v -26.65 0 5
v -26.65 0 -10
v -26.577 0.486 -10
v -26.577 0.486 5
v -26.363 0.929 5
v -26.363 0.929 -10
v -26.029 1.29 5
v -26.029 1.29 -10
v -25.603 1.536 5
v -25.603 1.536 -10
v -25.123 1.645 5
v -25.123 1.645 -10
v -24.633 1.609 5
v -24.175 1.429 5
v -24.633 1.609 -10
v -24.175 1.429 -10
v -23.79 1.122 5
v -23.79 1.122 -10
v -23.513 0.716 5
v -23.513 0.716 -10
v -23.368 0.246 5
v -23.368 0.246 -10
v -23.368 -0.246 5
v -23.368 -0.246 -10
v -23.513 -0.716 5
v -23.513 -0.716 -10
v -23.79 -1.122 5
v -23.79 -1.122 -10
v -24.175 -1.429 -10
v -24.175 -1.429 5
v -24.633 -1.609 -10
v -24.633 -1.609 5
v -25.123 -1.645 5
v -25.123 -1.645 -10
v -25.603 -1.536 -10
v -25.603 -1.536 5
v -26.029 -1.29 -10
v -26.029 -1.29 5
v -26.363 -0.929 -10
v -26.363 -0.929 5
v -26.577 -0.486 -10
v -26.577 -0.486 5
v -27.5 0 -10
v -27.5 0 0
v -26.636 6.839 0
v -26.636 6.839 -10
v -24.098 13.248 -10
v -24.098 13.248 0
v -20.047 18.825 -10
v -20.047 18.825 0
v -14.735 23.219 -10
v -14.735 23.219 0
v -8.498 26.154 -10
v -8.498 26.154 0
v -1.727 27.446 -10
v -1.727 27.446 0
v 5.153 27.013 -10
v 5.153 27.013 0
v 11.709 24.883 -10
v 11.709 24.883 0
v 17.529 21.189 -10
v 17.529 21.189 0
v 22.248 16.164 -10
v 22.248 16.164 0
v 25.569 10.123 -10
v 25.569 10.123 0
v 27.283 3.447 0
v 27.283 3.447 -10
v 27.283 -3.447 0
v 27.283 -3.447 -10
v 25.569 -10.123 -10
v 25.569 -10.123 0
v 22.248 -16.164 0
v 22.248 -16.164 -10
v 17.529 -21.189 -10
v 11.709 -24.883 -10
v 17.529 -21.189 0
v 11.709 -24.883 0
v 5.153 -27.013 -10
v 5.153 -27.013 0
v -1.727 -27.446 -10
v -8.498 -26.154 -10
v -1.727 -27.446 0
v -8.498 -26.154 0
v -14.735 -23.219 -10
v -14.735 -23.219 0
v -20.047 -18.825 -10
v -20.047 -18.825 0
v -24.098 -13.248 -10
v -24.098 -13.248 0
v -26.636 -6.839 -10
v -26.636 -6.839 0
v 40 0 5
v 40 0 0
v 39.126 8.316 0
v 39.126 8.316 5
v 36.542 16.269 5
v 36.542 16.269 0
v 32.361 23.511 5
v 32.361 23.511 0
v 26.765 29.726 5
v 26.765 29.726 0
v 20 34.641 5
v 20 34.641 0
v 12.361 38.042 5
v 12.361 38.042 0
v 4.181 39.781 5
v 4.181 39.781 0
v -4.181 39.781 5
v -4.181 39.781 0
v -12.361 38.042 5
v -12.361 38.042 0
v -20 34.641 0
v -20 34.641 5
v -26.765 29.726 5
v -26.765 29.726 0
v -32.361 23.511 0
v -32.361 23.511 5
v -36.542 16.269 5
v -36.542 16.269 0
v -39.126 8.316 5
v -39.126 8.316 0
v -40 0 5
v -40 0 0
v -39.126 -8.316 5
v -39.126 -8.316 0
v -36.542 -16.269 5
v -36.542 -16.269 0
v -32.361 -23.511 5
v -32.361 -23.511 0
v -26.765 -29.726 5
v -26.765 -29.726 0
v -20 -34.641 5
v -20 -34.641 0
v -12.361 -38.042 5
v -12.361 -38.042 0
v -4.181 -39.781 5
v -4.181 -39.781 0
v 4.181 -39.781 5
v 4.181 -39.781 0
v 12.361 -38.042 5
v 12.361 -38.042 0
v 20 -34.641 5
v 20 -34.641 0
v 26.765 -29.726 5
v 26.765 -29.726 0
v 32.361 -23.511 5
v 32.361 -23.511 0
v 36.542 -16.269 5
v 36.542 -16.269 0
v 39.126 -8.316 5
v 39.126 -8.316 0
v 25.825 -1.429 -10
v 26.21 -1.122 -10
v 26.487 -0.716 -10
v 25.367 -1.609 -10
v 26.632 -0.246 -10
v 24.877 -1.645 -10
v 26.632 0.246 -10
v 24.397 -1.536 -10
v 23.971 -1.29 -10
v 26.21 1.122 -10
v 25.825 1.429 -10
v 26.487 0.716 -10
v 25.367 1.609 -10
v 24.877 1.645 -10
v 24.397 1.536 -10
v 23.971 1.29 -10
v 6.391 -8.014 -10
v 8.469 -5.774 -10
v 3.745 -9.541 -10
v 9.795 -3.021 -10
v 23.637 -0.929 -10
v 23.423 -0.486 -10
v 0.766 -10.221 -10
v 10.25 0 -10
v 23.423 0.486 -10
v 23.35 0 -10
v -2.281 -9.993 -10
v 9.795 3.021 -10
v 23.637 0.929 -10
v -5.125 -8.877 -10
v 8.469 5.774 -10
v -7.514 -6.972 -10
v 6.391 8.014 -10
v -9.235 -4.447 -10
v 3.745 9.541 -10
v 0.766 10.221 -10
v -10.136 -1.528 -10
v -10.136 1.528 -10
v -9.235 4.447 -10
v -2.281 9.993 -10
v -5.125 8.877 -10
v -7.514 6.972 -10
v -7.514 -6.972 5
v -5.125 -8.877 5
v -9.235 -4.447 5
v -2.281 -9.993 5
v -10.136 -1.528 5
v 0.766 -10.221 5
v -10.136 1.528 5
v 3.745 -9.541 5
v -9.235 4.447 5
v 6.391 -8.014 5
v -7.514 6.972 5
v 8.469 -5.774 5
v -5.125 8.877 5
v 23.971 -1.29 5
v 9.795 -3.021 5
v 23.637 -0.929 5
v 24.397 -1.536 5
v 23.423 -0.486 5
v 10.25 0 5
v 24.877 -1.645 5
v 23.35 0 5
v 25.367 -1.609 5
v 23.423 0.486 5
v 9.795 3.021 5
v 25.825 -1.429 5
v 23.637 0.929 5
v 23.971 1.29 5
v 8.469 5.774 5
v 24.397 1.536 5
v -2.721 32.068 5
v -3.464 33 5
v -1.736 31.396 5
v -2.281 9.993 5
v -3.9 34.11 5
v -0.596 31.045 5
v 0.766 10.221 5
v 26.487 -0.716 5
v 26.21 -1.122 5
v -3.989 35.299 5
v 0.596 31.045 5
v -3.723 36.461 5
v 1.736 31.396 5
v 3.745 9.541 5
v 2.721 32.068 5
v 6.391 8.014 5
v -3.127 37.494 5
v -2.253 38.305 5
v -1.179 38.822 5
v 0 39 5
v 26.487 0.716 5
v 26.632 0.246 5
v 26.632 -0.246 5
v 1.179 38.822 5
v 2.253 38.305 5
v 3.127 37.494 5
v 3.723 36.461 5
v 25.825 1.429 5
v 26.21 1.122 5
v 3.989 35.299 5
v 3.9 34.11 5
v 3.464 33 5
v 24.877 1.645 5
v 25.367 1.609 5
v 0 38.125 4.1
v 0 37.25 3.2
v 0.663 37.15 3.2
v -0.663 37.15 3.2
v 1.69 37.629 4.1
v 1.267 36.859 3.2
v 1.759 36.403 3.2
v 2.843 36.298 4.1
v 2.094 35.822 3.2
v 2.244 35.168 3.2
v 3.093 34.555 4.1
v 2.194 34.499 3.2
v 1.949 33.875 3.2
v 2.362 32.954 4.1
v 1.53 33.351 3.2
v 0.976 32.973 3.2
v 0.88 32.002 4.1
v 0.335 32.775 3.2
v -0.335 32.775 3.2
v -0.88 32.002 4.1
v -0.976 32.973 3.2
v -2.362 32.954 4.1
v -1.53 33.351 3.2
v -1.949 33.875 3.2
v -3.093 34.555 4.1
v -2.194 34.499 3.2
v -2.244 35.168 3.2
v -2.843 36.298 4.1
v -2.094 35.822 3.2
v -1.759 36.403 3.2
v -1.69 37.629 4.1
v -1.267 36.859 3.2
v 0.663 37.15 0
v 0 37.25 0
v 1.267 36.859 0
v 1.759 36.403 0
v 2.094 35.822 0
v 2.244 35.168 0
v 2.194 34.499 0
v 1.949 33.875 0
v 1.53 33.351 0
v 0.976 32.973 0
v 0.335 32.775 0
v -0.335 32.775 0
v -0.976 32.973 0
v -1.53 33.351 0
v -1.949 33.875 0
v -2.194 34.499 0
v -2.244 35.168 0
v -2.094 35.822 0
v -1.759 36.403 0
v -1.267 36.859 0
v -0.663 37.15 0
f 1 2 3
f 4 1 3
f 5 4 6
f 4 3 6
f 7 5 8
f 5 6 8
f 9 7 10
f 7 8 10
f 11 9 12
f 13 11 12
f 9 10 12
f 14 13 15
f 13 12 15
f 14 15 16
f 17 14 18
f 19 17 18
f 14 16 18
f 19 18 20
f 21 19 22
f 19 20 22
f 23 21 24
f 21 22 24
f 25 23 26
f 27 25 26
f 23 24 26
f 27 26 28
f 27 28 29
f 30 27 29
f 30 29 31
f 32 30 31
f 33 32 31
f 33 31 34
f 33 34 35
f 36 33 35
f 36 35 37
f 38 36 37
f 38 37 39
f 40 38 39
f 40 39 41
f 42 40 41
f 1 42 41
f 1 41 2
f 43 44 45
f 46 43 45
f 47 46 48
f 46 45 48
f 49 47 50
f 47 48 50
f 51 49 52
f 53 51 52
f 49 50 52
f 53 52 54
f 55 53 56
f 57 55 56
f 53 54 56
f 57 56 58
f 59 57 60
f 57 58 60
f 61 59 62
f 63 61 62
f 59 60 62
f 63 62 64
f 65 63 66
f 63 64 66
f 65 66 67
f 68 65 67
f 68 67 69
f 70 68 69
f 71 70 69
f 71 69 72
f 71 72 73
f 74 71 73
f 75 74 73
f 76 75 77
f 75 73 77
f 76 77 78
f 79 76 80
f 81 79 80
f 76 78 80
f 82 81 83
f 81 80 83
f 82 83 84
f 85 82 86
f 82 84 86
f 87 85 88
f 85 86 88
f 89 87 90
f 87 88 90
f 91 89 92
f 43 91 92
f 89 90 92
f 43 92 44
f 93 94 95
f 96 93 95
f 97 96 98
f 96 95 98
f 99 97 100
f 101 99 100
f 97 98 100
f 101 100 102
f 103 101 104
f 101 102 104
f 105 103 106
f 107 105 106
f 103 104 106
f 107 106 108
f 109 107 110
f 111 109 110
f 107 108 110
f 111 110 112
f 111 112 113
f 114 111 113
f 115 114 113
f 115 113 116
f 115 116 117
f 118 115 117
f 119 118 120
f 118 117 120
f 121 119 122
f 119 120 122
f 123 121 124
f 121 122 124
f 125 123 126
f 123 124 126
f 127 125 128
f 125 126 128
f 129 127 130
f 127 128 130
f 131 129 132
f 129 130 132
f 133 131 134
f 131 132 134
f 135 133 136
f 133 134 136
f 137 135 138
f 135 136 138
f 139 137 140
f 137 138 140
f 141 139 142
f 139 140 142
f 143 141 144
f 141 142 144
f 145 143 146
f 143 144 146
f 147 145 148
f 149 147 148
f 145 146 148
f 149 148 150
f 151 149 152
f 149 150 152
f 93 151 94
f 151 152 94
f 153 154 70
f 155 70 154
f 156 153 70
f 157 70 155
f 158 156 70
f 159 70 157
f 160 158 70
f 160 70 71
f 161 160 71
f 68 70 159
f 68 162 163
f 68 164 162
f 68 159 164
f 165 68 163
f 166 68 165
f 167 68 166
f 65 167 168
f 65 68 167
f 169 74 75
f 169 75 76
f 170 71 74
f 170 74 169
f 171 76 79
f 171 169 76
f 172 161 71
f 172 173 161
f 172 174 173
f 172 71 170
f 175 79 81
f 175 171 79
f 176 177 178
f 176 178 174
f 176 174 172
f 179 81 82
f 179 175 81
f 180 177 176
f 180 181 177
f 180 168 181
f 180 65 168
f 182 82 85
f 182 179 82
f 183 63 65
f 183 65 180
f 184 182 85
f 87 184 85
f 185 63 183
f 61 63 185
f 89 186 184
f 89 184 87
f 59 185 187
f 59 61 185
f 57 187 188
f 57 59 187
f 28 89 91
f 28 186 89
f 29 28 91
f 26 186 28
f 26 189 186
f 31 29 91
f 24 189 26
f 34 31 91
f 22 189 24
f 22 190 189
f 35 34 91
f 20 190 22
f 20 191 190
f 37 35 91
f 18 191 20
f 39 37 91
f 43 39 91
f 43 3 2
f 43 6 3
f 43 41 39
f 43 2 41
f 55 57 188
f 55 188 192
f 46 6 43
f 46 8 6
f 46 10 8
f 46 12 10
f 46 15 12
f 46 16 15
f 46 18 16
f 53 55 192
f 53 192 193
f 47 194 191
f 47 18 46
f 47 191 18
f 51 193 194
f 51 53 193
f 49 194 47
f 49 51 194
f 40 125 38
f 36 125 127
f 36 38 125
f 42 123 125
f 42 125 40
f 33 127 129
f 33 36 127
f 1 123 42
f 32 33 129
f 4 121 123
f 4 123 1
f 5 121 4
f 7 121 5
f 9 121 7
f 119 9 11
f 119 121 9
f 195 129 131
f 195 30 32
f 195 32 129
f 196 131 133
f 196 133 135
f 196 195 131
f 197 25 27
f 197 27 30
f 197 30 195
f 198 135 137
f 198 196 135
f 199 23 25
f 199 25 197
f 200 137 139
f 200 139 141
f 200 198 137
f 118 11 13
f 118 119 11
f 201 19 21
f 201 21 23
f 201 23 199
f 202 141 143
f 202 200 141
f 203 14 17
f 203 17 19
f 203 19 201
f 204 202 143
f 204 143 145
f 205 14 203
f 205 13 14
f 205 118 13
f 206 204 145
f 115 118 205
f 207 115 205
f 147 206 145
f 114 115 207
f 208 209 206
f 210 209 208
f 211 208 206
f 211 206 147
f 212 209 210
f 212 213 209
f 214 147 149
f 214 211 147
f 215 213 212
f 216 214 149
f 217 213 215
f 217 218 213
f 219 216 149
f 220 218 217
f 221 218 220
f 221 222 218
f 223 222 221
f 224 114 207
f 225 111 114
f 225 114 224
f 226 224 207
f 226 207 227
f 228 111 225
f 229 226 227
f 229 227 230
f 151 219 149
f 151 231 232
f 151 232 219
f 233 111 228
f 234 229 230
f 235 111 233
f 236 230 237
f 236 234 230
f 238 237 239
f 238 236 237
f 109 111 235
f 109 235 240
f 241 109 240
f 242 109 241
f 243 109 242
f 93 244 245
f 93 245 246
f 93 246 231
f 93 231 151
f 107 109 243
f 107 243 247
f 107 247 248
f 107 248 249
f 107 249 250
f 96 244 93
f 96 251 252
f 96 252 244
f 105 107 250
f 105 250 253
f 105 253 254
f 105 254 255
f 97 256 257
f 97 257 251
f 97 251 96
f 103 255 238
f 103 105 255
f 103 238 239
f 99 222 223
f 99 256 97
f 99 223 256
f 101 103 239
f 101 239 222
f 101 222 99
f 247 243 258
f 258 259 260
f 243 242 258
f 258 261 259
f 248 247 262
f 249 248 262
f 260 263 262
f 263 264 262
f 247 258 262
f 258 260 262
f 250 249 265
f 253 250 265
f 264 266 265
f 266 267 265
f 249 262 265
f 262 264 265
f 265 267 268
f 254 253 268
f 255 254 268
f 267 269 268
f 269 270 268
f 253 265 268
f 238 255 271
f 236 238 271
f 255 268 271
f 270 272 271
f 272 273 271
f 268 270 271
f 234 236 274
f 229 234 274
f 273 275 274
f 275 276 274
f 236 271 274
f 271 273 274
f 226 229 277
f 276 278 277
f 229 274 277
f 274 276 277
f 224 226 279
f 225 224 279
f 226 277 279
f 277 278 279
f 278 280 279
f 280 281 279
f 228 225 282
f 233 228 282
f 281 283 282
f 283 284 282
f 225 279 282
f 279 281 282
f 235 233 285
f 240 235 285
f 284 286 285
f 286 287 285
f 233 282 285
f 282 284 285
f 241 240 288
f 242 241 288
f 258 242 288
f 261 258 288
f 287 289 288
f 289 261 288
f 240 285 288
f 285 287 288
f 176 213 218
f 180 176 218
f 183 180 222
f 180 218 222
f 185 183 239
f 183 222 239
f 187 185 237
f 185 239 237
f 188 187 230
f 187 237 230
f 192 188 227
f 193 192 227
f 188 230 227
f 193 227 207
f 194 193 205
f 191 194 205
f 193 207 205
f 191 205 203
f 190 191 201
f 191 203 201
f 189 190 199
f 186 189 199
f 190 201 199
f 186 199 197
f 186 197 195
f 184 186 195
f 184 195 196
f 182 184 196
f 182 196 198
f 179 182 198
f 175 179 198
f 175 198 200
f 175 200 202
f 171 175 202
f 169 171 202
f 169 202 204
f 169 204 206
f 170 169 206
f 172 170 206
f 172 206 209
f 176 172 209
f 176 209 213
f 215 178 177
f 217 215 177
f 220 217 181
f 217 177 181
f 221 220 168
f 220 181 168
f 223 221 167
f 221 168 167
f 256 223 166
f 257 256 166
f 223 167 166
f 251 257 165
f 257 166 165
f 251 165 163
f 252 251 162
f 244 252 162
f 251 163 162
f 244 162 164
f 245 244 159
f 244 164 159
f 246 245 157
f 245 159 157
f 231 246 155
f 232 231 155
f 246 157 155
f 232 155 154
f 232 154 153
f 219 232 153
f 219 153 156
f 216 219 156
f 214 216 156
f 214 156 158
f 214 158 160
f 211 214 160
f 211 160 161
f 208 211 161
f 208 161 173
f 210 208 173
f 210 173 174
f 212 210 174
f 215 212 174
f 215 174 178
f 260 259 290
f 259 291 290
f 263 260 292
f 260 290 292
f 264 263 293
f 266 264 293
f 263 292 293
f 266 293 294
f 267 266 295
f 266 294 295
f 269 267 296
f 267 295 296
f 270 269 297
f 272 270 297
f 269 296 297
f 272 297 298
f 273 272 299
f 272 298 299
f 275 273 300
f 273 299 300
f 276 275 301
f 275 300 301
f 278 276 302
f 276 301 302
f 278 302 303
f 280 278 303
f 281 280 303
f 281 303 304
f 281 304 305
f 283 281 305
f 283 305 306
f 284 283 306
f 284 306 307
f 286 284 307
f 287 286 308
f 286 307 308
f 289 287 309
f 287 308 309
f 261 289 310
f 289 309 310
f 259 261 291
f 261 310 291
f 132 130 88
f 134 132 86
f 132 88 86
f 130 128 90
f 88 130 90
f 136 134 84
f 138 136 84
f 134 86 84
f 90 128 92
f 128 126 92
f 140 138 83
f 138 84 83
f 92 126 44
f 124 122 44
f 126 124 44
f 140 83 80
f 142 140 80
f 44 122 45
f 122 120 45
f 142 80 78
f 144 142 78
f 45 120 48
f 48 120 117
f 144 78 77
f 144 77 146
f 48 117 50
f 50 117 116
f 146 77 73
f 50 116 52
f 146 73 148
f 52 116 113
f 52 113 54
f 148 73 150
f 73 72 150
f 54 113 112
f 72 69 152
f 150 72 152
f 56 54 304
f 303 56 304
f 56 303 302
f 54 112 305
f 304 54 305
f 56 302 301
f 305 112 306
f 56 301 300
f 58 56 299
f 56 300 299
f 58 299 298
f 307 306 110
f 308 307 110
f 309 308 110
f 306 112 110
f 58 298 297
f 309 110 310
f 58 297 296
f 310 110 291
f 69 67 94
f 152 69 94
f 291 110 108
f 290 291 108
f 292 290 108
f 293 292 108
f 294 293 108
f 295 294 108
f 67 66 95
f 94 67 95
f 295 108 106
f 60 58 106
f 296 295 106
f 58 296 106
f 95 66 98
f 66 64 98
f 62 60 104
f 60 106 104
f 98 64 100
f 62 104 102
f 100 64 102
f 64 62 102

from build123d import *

# Parameters (mm, degrees)
CROQUIS1_R              = 40
SALIENTE_EXTRUIR1_DEPTH = 5
CROQUIS3_R              = 27.5
SALIENTE_EXTRUIR2_DEPTH = 10
TALADRO_ROSCADO_M41_D   = 3.3
CROQUIS6_R              = 10.25
CORTAR_EXTRUIR1_DEPTH   = 34.8


with BuildPart() as part:
    # Croquis1 → Saliente-Extruir1 (new body)
    with BuildSketch(Plane.XY):
        Circle(CROQUIS1_R)
    extrude(amount=SALIENTE_EXTRUIR1_DEPTH)

    # Croquis2 → Cortar-Revolución1 (revolve, cut)
    with BuildSketch(Plane(origin=(0, 0, 0), x_dir=(0, 0, -1), z_dir=(1, 0, 0))):
        Polygon((-5, 35), (-5, 39), (-3.2, 37.25), (0, 37.25), (0, 35), align=None)
    revolve(axis=Axis((0, 35, 20.622839442), (0, 0, -1)), mode=Mode.SUBTRACT)

    # Croquis3 → Saliente-Extruir2 (add)
    with BuildSketch(Plane(origin=(0, 0, 0), x_dir=(-1, 0, 0), z_dir=(0, 0, -1))):
        Circle(CROQUIS3_R)
    extrude(amount=SALIENTE_EXTRUIR2_DEPTH)

    # Taladro roscado M41 (through all)
    with Locations(Plane.XY.offset(5)):
        with Locations((-25, 0), (25, 0)):
            Hole(TALADRO_ROSCADO_M41_D / 2)

    # Croquis6 → Cortar-Extruir1 (cut)
    with BuildSketch(Plane.XY.offset(5)):
        Circle(CROQUIS6_R)
    extrude(amount=-CORTAR_EXTRUIR1_DEPTH, mode=Mode.SUBTRACT)


solid = part.part
